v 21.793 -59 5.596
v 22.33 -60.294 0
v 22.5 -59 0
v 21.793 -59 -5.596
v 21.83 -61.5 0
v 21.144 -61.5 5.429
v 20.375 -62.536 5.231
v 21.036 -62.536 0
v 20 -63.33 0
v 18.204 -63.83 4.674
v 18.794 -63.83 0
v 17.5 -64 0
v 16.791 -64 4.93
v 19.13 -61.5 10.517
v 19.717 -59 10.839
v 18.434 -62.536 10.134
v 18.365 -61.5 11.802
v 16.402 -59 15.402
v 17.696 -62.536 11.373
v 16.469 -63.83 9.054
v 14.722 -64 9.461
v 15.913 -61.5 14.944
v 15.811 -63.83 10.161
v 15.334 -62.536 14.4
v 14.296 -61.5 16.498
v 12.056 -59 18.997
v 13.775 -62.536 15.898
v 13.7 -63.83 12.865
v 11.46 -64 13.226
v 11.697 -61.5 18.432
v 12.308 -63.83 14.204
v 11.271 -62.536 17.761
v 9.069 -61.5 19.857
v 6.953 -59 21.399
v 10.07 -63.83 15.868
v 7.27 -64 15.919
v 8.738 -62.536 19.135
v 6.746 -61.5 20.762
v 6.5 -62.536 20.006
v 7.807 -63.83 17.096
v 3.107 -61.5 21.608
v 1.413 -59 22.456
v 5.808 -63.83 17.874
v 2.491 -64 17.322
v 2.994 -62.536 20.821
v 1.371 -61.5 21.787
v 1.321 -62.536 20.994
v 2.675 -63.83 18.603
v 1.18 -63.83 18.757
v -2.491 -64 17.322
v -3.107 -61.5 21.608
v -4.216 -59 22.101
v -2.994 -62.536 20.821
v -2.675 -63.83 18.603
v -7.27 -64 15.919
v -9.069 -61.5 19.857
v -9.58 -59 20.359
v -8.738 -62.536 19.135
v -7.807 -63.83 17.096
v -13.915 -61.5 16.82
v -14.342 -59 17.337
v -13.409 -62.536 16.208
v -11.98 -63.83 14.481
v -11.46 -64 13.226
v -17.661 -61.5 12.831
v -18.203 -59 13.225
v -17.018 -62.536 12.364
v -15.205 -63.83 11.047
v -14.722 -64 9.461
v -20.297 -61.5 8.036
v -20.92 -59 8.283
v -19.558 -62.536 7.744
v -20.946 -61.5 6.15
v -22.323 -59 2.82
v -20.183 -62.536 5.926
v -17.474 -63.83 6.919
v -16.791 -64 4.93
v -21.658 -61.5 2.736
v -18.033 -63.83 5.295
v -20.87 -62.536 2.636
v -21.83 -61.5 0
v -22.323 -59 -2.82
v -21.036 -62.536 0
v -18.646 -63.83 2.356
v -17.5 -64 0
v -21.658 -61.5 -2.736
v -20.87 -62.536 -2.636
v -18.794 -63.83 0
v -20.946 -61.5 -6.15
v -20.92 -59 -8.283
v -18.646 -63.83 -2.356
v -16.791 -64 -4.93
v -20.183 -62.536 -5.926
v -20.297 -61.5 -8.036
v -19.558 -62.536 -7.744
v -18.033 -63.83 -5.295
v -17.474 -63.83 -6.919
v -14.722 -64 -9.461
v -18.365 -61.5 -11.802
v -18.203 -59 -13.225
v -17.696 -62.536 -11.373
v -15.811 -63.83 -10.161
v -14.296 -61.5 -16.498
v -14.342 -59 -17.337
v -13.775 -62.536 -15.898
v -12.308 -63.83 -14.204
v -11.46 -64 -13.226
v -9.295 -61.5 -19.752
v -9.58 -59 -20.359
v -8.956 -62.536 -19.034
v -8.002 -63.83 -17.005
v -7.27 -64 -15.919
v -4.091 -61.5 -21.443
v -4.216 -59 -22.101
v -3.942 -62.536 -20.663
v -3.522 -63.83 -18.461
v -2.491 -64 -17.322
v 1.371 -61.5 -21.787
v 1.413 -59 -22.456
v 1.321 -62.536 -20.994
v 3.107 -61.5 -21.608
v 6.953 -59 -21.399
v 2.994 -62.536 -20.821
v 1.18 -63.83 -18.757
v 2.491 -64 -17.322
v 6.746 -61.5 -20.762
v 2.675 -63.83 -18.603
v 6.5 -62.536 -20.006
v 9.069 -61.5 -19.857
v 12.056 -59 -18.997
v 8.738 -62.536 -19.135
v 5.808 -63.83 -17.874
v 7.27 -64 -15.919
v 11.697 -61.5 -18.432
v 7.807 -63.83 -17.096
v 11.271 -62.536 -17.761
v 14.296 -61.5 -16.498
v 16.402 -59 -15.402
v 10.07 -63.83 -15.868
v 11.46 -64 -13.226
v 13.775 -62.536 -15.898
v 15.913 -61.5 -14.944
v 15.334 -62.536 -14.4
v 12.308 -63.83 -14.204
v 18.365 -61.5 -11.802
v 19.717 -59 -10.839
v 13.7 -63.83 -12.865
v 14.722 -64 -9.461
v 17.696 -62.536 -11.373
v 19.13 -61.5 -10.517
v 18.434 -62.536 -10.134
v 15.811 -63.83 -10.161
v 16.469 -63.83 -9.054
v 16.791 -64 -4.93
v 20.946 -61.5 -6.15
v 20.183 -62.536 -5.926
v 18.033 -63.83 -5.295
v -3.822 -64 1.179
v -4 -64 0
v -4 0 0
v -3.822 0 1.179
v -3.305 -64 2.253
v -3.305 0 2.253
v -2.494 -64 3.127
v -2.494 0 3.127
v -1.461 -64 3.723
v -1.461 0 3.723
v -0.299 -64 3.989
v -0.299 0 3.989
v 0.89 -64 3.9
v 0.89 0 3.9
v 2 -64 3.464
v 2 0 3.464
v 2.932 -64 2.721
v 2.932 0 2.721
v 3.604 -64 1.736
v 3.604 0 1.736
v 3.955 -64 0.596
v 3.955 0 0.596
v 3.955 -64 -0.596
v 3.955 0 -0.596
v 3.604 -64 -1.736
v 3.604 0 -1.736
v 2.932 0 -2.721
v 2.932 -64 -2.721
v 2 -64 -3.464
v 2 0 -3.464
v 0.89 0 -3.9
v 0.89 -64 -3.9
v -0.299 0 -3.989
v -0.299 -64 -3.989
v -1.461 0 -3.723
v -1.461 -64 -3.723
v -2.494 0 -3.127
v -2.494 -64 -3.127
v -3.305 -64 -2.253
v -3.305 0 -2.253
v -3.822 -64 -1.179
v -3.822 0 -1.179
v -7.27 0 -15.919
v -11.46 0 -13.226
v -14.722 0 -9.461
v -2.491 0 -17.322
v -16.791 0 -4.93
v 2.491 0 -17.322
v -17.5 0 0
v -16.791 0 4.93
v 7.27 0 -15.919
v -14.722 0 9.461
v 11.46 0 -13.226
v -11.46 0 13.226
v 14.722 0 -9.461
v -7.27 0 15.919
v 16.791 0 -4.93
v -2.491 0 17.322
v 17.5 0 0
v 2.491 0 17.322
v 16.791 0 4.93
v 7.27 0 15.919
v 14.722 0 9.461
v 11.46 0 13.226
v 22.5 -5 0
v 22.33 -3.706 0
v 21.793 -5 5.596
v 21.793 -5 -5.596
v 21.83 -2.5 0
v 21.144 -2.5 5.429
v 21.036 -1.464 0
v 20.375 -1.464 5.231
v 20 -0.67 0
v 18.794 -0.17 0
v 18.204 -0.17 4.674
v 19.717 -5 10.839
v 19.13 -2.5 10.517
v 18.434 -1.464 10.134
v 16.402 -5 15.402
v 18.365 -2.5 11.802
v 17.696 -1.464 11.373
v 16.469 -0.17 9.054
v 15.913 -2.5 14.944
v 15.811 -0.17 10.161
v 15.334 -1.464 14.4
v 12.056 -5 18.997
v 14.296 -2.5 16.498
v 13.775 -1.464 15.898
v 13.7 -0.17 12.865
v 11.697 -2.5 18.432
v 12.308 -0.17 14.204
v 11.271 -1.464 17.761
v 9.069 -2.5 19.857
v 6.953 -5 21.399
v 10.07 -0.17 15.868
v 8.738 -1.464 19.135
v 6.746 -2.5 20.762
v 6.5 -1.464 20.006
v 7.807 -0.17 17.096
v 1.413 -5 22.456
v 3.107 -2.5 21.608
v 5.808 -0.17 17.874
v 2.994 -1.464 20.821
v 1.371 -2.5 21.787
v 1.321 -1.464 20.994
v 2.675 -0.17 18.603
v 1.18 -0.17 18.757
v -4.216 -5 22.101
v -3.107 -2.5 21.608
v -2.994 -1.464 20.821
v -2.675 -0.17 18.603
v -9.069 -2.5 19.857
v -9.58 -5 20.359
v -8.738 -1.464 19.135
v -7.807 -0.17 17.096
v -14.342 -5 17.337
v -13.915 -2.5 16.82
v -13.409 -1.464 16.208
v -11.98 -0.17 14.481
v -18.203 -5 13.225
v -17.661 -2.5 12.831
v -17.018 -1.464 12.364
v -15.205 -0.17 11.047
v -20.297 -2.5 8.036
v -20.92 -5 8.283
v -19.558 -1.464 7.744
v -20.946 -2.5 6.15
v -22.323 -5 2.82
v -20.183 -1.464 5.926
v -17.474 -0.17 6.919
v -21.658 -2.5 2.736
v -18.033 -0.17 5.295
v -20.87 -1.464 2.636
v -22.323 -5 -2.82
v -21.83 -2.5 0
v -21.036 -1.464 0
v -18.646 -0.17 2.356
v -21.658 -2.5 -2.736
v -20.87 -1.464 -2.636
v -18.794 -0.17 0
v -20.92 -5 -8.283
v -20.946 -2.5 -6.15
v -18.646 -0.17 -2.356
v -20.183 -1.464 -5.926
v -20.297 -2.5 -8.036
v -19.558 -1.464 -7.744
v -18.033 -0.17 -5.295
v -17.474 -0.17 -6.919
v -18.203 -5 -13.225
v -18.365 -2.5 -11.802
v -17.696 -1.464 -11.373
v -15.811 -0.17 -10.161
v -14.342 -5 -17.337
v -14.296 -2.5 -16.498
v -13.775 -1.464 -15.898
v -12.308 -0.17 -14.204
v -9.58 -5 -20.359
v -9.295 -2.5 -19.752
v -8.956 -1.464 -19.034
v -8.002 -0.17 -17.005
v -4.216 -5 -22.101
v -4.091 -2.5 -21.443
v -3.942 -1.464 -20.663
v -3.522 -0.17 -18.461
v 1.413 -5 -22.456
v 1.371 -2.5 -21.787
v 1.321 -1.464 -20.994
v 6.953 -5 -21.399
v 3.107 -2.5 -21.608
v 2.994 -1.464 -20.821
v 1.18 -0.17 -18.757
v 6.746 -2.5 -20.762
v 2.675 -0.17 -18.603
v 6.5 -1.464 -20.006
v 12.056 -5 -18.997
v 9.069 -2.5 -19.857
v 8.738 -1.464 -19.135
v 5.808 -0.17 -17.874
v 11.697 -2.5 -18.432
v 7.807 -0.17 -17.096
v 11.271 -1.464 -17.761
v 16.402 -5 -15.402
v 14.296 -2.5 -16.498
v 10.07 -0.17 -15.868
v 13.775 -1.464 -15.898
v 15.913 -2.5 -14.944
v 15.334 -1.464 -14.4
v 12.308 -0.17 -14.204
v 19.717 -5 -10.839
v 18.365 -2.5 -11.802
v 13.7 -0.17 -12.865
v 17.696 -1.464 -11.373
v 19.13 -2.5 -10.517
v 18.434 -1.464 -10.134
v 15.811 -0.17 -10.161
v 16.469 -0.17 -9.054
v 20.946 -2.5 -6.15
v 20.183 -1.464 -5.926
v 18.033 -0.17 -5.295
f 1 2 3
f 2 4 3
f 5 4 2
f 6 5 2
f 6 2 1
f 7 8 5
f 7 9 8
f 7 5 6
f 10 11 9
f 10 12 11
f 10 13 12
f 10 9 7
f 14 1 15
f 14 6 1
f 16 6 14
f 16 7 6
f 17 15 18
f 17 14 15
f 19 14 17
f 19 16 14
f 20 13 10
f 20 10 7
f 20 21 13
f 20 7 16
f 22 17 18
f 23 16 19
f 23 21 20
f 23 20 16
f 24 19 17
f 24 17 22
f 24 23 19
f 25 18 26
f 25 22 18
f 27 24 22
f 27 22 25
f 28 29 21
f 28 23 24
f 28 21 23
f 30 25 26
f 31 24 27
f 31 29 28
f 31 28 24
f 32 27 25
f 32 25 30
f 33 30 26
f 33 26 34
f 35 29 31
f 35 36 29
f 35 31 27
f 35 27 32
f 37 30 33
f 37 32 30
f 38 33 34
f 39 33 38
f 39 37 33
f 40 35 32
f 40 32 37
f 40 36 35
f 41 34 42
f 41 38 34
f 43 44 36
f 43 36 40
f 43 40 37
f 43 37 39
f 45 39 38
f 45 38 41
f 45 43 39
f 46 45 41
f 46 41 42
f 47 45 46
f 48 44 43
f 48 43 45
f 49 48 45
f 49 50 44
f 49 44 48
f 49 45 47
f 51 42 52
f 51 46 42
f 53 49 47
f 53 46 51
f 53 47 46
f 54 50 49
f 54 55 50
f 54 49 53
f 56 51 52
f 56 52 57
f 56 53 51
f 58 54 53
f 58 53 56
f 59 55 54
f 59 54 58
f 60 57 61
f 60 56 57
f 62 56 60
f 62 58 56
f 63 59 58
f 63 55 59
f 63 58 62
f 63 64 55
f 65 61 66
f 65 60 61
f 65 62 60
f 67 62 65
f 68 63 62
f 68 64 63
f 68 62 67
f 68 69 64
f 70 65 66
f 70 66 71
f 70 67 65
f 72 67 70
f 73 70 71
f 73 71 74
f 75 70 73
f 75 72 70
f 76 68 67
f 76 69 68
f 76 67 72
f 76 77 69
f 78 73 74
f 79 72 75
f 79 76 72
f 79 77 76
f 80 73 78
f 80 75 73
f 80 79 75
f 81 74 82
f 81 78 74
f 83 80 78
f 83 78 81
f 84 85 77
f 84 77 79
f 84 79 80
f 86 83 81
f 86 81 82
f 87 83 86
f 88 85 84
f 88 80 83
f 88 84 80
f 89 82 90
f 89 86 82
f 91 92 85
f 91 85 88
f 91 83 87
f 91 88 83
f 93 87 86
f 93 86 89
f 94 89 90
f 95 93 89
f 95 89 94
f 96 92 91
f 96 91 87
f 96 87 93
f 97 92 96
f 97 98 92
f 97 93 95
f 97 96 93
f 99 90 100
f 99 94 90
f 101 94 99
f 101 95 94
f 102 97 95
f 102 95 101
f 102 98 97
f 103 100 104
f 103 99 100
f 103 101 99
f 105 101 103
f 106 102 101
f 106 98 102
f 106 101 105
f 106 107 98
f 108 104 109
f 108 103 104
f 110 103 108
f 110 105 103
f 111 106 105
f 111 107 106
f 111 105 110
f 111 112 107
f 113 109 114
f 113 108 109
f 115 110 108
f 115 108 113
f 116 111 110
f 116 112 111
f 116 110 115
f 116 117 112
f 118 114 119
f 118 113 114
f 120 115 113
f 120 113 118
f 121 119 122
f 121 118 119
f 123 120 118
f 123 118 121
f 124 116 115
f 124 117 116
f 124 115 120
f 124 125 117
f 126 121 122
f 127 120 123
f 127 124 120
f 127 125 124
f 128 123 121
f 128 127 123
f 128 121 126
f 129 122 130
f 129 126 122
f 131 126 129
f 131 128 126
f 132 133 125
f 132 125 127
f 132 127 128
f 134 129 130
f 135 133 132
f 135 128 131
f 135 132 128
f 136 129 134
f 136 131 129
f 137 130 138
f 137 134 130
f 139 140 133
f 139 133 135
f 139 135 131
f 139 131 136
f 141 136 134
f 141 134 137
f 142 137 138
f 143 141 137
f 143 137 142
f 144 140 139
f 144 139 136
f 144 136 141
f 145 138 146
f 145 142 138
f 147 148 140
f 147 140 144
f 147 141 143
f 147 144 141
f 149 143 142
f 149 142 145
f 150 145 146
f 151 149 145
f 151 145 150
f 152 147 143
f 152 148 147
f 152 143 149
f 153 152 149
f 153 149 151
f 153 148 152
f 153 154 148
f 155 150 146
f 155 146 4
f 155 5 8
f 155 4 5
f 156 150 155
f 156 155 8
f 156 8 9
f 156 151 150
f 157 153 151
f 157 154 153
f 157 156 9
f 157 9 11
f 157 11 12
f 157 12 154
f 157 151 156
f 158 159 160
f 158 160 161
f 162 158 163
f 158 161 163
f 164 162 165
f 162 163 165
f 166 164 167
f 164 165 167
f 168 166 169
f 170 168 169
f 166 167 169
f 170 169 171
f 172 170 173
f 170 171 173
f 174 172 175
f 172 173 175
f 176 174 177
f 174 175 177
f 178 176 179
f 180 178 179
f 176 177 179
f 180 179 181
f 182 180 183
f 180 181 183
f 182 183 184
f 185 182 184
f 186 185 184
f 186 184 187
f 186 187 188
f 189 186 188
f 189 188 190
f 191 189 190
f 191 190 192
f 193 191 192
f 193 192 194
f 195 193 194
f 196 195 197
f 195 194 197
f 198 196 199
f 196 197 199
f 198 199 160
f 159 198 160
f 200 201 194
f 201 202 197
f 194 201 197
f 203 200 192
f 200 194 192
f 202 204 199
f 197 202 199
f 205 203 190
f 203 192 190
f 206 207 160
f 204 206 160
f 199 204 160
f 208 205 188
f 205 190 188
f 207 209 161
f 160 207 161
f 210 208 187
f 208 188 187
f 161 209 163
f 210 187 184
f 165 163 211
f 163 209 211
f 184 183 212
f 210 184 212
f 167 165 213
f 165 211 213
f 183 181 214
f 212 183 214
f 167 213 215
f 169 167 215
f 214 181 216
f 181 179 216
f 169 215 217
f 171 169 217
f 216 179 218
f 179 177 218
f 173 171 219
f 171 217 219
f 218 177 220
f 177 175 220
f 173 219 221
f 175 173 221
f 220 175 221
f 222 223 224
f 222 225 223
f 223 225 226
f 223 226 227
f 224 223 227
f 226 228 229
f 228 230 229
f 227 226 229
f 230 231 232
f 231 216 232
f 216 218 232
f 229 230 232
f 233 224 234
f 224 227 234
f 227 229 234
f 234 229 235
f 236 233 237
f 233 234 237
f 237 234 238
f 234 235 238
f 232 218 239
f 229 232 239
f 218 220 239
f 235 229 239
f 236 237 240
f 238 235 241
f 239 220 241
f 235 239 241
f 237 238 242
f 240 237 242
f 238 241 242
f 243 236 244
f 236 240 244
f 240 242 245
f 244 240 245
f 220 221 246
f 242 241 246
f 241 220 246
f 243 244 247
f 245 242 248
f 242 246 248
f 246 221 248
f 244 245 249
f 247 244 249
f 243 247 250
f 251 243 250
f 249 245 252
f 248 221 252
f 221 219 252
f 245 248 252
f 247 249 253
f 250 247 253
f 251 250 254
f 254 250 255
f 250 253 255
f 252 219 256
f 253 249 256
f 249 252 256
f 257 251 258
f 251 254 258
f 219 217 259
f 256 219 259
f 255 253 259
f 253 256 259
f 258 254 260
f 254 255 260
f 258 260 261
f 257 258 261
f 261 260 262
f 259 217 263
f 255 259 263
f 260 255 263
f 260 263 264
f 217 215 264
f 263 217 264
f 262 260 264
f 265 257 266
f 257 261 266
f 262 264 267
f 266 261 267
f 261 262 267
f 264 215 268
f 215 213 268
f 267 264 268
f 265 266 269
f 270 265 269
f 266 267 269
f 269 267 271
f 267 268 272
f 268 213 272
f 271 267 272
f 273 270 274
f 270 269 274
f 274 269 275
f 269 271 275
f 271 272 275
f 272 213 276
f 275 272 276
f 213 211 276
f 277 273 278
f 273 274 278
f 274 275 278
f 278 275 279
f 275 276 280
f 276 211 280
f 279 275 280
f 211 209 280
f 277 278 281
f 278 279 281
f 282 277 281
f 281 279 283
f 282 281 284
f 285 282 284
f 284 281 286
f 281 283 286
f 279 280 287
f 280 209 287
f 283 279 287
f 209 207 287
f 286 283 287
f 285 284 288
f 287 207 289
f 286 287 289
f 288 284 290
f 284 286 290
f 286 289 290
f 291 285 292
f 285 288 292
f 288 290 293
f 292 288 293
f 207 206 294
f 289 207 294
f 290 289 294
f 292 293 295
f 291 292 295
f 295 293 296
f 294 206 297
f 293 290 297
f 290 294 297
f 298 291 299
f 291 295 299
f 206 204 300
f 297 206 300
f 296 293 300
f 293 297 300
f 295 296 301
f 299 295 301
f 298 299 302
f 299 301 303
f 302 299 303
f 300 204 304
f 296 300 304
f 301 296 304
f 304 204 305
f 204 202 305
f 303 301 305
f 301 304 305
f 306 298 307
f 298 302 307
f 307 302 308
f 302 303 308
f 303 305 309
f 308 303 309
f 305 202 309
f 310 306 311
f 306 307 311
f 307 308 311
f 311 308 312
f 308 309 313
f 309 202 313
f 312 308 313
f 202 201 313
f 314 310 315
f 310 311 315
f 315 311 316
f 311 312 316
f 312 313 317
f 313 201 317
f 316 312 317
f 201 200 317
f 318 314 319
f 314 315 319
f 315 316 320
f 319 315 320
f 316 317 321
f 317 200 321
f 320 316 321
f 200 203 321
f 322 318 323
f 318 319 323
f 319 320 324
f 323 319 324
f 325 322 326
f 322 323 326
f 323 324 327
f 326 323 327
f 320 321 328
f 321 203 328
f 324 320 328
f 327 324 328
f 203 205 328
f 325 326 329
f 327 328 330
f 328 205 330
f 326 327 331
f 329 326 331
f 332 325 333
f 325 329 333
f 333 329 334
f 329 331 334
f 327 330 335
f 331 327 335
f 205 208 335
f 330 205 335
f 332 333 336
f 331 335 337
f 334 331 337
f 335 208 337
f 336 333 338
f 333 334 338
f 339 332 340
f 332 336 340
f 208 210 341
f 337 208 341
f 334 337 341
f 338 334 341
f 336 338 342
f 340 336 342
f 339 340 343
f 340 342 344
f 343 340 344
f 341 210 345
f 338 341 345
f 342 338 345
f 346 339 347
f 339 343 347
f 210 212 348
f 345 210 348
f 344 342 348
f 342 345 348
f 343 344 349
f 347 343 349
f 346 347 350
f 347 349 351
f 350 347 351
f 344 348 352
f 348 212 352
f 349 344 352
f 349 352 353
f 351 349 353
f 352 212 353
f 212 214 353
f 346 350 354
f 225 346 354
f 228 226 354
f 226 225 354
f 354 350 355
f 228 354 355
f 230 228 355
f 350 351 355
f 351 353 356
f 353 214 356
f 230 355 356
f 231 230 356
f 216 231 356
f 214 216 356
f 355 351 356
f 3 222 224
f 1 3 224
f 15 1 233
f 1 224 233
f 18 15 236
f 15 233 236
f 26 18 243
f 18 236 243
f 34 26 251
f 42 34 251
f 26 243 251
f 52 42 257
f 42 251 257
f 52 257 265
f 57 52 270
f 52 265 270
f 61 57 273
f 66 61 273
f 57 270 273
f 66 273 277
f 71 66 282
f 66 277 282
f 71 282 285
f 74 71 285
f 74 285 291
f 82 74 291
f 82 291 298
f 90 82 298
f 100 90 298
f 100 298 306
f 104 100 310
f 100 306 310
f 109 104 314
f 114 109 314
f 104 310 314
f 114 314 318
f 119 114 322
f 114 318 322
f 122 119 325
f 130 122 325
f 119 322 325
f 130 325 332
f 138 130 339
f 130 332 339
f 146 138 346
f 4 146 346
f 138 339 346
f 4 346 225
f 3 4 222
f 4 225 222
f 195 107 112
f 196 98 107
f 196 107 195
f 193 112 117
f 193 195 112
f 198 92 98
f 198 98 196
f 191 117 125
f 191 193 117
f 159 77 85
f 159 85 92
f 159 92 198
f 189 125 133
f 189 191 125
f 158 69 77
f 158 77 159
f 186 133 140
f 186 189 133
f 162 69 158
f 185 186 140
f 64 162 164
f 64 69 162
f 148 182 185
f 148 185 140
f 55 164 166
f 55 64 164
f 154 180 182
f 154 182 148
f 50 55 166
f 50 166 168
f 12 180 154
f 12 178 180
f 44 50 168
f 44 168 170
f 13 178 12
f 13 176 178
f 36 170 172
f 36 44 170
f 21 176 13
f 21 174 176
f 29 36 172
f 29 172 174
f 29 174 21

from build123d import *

# Parameters (mm, degrees)
F0_R     = 22.5
F1_DEPTH = 64
F2_R     = 4
F3_DEPTH = 64
F4_R     = 5


with BuildPart() as f1:
    # F0 (on Front) → F1 (new body)
    with BuildSketch(Plane.XZ):
        Circle(F0_R)
    extrude(amount=F1_DEPTH)

    # F2 (on face) → F3 (cut)
    with BuildSketch(Plane(origin=(0, 0, 0), x_dir=(-1, 0, 0), z_dir=(0, 1, 0))):
        Circle(F2_R)
    extrude(amount=-F3_DEPTH, mode=Mode.SUBTRACT)

    # F4
    f4_edges = [f1.edges().sort_by_distance(p)[0] for p in [
        (-22.5, -64, 0),
        (-22.5, 0, 0),
    ]]
    fillet(f4_edges, radius=F4_R)


solid = f1.part
